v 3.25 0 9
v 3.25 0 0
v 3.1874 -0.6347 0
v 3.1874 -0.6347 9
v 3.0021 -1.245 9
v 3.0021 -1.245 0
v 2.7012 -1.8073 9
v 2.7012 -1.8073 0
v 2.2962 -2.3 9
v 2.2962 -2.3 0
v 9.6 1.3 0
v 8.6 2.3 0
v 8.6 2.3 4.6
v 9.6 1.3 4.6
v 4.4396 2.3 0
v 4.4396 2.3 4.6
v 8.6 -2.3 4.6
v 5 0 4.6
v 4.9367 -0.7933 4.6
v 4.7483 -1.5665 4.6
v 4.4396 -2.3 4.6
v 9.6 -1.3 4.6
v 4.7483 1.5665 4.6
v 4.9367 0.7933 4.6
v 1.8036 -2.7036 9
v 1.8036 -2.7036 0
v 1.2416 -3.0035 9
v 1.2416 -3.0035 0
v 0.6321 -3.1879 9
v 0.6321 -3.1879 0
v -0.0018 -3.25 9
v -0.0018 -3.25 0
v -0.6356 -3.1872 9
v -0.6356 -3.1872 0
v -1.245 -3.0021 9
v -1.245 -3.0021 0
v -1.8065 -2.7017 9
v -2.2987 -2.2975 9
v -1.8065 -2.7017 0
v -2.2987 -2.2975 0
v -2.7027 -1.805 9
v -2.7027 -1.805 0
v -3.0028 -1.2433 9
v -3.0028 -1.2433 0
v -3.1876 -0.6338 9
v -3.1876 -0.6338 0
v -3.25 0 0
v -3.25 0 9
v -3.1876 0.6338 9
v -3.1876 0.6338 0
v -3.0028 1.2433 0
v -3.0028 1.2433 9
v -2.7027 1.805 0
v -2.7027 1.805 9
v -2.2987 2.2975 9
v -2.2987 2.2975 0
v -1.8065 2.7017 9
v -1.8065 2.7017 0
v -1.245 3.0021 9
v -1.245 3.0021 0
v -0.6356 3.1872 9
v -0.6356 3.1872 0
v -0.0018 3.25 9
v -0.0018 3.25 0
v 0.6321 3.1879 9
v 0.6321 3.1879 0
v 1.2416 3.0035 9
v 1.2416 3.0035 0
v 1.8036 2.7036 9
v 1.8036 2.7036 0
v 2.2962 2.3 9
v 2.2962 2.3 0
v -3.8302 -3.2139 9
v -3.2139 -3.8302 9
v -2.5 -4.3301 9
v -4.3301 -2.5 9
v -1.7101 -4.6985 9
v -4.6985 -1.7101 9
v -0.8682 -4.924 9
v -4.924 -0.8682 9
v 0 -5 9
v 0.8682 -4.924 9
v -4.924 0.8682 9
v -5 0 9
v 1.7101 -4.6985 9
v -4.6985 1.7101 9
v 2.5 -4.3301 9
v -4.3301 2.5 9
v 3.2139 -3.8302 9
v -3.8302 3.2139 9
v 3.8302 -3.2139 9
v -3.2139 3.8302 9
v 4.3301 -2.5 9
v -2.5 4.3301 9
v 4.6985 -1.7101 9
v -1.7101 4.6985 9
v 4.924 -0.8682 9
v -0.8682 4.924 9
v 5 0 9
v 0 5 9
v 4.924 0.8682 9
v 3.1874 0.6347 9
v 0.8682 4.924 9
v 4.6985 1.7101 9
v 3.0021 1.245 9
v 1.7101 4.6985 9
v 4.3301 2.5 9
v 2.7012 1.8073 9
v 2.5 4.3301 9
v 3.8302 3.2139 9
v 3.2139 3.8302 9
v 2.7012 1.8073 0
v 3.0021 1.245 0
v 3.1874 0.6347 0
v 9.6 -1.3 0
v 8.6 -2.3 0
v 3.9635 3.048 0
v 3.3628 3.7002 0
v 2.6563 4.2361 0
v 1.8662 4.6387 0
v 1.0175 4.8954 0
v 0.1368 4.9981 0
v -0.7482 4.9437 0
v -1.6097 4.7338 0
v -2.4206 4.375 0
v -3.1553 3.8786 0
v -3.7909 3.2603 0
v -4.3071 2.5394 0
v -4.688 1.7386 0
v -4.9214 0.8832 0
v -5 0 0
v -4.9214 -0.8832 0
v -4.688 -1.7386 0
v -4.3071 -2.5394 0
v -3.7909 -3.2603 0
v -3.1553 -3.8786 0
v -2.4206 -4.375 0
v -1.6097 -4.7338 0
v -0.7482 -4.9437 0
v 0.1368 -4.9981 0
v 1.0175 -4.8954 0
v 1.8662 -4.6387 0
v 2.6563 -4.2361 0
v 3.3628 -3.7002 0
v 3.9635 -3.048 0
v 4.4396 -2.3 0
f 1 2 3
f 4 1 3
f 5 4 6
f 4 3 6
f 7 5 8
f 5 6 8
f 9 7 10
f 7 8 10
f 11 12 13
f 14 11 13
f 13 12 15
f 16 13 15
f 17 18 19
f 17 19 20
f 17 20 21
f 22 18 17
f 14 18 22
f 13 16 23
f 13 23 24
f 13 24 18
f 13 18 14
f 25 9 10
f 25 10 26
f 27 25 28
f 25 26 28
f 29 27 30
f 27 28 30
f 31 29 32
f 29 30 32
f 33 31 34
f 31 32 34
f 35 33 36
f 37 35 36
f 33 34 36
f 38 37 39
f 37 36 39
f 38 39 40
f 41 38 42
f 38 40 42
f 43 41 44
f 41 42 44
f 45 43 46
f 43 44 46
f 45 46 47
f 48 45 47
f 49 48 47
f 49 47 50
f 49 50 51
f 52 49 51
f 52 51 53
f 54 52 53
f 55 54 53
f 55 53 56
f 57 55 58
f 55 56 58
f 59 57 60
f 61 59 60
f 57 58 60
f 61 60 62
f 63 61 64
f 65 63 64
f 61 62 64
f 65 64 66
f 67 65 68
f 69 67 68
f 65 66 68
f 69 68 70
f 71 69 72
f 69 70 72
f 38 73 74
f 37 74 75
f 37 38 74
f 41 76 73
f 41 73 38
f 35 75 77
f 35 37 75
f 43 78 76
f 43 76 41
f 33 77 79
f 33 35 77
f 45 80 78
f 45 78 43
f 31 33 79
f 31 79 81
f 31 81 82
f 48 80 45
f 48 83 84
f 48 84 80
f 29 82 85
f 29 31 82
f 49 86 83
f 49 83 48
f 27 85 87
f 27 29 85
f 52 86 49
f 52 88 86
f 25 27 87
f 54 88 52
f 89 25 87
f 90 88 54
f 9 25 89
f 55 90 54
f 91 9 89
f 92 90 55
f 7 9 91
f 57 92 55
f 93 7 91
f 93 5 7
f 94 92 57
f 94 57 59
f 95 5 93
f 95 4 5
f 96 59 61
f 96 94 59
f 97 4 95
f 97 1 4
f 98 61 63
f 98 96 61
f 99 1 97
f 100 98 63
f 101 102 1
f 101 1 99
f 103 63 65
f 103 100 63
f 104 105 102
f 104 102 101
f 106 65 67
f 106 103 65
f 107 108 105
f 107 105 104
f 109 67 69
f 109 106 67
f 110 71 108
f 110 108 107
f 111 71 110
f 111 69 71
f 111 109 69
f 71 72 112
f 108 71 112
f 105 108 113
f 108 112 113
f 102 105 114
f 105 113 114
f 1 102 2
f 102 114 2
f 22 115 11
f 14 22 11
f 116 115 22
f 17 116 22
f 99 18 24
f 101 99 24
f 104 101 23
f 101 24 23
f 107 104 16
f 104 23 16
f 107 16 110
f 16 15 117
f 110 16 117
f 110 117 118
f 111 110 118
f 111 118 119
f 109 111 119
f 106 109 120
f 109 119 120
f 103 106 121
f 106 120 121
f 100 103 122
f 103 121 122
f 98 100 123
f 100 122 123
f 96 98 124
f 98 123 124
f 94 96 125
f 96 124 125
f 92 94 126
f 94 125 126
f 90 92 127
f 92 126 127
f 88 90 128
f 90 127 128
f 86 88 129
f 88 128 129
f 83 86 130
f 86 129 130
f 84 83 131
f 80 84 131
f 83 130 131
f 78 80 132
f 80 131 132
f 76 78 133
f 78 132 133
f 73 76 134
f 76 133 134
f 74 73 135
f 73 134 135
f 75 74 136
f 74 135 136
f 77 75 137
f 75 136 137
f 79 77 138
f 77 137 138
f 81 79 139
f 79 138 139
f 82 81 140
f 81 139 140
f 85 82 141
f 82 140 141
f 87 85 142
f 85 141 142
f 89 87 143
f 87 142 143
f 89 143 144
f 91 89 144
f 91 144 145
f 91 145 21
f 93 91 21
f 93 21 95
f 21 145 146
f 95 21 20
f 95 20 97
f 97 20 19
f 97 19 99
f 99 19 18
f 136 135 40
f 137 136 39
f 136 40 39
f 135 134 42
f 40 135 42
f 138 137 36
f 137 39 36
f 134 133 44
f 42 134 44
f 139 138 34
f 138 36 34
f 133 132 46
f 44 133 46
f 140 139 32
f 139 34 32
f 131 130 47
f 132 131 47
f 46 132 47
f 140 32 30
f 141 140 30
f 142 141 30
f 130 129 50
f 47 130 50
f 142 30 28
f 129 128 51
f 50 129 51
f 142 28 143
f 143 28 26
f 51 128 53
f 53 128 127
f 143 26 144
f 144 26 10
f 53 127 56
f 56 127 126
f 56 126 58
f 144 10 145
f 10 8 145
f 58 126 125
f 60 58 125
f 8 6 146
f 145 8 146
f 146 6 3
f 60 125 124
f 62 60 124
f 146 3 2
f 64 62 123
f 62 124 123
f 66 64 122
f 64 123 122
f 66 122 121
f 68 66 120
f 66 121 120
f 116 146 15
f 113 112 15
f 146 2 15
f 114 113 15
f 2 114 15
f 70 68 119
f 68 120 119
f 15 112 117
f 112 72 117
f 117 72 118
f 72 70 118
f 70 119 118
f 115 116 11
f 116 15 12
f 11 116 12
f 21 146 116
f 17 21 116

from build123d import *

# Parameters (mm, degrees)
F1_DEPTH = 9
F2_DEPTH = 4.6
F3_SIZE  = 1


with BuildPart() as f1:
    # F0 (on Top) → F1 (new body)
    with BuildSketch(Plane.XY):
        with BuildLine():
            ThreePointArc((4.4395945761, 2.3), (-5, 0), (4.4395945761, -2.3))
            Line((4.4395945761, -2.3), (2.2961925006, -2.3))
            ThreePointArc((2.2961925006, -2.3), (-3.25, 0), (2.2961925006, 2.3))
            Line((2.2961925006, 2.3), (4.4395945761, 2.3))
        make_face()
        with BuildLine():
            Line((2.2961925006, -2.3), (4.4395945761, -2.3))
            ThreePointArc((4.4395945761, -2.3), (4.8578788005, -1.1836441863), (5, 0))
            ThreePointArc((5, 0), (4.8578788005, 1.1836441863), (4.4395945761, 2.3))
            Line((4.4395945761, 2.3), (2.2961925006, 2.3))
            ThreePointArc((2.2961925006, 2.3), (3.0020930721, 1.244964733), (3.25, 0))
            ThreePointArc((3.25, 0), (3.0020930721, -1.244964733), (2.2961925006, -2.3))
        make_face()
    extrude(amount=F1_DEPTH)

    # F0 (on Top) → F2 (join)
    with BuildSketch(Plane.XY):
        with BuildLine():
            Line((4.4395945761, -2.3), (9.6, -2.3))
            Line((9.6, -2.3), (9.6, 2.3))
            Line((9.6, 2.3), (4.4395945761, 2.3))
            ThreePointArc((4.4395945761, 2.3), (4.8578788005, 1.1836441863), (5, 0))
            ThreePointArc((5, 0), (4.8578788005, -1.1836441863), (4.4395945761, -2.3))
        make_face()
    extrude(amount=F2_DEPTH)

    # F3
    f3_edges = [f1.edges().sort_by_distance(p)[0] for p in [
        (9.6, -2.3, 2.3),
        (9.6, 2.3, 2.3),
    ]]
    chamfer(f3_edges, length=F3_SIZE)


solid = f1.part
